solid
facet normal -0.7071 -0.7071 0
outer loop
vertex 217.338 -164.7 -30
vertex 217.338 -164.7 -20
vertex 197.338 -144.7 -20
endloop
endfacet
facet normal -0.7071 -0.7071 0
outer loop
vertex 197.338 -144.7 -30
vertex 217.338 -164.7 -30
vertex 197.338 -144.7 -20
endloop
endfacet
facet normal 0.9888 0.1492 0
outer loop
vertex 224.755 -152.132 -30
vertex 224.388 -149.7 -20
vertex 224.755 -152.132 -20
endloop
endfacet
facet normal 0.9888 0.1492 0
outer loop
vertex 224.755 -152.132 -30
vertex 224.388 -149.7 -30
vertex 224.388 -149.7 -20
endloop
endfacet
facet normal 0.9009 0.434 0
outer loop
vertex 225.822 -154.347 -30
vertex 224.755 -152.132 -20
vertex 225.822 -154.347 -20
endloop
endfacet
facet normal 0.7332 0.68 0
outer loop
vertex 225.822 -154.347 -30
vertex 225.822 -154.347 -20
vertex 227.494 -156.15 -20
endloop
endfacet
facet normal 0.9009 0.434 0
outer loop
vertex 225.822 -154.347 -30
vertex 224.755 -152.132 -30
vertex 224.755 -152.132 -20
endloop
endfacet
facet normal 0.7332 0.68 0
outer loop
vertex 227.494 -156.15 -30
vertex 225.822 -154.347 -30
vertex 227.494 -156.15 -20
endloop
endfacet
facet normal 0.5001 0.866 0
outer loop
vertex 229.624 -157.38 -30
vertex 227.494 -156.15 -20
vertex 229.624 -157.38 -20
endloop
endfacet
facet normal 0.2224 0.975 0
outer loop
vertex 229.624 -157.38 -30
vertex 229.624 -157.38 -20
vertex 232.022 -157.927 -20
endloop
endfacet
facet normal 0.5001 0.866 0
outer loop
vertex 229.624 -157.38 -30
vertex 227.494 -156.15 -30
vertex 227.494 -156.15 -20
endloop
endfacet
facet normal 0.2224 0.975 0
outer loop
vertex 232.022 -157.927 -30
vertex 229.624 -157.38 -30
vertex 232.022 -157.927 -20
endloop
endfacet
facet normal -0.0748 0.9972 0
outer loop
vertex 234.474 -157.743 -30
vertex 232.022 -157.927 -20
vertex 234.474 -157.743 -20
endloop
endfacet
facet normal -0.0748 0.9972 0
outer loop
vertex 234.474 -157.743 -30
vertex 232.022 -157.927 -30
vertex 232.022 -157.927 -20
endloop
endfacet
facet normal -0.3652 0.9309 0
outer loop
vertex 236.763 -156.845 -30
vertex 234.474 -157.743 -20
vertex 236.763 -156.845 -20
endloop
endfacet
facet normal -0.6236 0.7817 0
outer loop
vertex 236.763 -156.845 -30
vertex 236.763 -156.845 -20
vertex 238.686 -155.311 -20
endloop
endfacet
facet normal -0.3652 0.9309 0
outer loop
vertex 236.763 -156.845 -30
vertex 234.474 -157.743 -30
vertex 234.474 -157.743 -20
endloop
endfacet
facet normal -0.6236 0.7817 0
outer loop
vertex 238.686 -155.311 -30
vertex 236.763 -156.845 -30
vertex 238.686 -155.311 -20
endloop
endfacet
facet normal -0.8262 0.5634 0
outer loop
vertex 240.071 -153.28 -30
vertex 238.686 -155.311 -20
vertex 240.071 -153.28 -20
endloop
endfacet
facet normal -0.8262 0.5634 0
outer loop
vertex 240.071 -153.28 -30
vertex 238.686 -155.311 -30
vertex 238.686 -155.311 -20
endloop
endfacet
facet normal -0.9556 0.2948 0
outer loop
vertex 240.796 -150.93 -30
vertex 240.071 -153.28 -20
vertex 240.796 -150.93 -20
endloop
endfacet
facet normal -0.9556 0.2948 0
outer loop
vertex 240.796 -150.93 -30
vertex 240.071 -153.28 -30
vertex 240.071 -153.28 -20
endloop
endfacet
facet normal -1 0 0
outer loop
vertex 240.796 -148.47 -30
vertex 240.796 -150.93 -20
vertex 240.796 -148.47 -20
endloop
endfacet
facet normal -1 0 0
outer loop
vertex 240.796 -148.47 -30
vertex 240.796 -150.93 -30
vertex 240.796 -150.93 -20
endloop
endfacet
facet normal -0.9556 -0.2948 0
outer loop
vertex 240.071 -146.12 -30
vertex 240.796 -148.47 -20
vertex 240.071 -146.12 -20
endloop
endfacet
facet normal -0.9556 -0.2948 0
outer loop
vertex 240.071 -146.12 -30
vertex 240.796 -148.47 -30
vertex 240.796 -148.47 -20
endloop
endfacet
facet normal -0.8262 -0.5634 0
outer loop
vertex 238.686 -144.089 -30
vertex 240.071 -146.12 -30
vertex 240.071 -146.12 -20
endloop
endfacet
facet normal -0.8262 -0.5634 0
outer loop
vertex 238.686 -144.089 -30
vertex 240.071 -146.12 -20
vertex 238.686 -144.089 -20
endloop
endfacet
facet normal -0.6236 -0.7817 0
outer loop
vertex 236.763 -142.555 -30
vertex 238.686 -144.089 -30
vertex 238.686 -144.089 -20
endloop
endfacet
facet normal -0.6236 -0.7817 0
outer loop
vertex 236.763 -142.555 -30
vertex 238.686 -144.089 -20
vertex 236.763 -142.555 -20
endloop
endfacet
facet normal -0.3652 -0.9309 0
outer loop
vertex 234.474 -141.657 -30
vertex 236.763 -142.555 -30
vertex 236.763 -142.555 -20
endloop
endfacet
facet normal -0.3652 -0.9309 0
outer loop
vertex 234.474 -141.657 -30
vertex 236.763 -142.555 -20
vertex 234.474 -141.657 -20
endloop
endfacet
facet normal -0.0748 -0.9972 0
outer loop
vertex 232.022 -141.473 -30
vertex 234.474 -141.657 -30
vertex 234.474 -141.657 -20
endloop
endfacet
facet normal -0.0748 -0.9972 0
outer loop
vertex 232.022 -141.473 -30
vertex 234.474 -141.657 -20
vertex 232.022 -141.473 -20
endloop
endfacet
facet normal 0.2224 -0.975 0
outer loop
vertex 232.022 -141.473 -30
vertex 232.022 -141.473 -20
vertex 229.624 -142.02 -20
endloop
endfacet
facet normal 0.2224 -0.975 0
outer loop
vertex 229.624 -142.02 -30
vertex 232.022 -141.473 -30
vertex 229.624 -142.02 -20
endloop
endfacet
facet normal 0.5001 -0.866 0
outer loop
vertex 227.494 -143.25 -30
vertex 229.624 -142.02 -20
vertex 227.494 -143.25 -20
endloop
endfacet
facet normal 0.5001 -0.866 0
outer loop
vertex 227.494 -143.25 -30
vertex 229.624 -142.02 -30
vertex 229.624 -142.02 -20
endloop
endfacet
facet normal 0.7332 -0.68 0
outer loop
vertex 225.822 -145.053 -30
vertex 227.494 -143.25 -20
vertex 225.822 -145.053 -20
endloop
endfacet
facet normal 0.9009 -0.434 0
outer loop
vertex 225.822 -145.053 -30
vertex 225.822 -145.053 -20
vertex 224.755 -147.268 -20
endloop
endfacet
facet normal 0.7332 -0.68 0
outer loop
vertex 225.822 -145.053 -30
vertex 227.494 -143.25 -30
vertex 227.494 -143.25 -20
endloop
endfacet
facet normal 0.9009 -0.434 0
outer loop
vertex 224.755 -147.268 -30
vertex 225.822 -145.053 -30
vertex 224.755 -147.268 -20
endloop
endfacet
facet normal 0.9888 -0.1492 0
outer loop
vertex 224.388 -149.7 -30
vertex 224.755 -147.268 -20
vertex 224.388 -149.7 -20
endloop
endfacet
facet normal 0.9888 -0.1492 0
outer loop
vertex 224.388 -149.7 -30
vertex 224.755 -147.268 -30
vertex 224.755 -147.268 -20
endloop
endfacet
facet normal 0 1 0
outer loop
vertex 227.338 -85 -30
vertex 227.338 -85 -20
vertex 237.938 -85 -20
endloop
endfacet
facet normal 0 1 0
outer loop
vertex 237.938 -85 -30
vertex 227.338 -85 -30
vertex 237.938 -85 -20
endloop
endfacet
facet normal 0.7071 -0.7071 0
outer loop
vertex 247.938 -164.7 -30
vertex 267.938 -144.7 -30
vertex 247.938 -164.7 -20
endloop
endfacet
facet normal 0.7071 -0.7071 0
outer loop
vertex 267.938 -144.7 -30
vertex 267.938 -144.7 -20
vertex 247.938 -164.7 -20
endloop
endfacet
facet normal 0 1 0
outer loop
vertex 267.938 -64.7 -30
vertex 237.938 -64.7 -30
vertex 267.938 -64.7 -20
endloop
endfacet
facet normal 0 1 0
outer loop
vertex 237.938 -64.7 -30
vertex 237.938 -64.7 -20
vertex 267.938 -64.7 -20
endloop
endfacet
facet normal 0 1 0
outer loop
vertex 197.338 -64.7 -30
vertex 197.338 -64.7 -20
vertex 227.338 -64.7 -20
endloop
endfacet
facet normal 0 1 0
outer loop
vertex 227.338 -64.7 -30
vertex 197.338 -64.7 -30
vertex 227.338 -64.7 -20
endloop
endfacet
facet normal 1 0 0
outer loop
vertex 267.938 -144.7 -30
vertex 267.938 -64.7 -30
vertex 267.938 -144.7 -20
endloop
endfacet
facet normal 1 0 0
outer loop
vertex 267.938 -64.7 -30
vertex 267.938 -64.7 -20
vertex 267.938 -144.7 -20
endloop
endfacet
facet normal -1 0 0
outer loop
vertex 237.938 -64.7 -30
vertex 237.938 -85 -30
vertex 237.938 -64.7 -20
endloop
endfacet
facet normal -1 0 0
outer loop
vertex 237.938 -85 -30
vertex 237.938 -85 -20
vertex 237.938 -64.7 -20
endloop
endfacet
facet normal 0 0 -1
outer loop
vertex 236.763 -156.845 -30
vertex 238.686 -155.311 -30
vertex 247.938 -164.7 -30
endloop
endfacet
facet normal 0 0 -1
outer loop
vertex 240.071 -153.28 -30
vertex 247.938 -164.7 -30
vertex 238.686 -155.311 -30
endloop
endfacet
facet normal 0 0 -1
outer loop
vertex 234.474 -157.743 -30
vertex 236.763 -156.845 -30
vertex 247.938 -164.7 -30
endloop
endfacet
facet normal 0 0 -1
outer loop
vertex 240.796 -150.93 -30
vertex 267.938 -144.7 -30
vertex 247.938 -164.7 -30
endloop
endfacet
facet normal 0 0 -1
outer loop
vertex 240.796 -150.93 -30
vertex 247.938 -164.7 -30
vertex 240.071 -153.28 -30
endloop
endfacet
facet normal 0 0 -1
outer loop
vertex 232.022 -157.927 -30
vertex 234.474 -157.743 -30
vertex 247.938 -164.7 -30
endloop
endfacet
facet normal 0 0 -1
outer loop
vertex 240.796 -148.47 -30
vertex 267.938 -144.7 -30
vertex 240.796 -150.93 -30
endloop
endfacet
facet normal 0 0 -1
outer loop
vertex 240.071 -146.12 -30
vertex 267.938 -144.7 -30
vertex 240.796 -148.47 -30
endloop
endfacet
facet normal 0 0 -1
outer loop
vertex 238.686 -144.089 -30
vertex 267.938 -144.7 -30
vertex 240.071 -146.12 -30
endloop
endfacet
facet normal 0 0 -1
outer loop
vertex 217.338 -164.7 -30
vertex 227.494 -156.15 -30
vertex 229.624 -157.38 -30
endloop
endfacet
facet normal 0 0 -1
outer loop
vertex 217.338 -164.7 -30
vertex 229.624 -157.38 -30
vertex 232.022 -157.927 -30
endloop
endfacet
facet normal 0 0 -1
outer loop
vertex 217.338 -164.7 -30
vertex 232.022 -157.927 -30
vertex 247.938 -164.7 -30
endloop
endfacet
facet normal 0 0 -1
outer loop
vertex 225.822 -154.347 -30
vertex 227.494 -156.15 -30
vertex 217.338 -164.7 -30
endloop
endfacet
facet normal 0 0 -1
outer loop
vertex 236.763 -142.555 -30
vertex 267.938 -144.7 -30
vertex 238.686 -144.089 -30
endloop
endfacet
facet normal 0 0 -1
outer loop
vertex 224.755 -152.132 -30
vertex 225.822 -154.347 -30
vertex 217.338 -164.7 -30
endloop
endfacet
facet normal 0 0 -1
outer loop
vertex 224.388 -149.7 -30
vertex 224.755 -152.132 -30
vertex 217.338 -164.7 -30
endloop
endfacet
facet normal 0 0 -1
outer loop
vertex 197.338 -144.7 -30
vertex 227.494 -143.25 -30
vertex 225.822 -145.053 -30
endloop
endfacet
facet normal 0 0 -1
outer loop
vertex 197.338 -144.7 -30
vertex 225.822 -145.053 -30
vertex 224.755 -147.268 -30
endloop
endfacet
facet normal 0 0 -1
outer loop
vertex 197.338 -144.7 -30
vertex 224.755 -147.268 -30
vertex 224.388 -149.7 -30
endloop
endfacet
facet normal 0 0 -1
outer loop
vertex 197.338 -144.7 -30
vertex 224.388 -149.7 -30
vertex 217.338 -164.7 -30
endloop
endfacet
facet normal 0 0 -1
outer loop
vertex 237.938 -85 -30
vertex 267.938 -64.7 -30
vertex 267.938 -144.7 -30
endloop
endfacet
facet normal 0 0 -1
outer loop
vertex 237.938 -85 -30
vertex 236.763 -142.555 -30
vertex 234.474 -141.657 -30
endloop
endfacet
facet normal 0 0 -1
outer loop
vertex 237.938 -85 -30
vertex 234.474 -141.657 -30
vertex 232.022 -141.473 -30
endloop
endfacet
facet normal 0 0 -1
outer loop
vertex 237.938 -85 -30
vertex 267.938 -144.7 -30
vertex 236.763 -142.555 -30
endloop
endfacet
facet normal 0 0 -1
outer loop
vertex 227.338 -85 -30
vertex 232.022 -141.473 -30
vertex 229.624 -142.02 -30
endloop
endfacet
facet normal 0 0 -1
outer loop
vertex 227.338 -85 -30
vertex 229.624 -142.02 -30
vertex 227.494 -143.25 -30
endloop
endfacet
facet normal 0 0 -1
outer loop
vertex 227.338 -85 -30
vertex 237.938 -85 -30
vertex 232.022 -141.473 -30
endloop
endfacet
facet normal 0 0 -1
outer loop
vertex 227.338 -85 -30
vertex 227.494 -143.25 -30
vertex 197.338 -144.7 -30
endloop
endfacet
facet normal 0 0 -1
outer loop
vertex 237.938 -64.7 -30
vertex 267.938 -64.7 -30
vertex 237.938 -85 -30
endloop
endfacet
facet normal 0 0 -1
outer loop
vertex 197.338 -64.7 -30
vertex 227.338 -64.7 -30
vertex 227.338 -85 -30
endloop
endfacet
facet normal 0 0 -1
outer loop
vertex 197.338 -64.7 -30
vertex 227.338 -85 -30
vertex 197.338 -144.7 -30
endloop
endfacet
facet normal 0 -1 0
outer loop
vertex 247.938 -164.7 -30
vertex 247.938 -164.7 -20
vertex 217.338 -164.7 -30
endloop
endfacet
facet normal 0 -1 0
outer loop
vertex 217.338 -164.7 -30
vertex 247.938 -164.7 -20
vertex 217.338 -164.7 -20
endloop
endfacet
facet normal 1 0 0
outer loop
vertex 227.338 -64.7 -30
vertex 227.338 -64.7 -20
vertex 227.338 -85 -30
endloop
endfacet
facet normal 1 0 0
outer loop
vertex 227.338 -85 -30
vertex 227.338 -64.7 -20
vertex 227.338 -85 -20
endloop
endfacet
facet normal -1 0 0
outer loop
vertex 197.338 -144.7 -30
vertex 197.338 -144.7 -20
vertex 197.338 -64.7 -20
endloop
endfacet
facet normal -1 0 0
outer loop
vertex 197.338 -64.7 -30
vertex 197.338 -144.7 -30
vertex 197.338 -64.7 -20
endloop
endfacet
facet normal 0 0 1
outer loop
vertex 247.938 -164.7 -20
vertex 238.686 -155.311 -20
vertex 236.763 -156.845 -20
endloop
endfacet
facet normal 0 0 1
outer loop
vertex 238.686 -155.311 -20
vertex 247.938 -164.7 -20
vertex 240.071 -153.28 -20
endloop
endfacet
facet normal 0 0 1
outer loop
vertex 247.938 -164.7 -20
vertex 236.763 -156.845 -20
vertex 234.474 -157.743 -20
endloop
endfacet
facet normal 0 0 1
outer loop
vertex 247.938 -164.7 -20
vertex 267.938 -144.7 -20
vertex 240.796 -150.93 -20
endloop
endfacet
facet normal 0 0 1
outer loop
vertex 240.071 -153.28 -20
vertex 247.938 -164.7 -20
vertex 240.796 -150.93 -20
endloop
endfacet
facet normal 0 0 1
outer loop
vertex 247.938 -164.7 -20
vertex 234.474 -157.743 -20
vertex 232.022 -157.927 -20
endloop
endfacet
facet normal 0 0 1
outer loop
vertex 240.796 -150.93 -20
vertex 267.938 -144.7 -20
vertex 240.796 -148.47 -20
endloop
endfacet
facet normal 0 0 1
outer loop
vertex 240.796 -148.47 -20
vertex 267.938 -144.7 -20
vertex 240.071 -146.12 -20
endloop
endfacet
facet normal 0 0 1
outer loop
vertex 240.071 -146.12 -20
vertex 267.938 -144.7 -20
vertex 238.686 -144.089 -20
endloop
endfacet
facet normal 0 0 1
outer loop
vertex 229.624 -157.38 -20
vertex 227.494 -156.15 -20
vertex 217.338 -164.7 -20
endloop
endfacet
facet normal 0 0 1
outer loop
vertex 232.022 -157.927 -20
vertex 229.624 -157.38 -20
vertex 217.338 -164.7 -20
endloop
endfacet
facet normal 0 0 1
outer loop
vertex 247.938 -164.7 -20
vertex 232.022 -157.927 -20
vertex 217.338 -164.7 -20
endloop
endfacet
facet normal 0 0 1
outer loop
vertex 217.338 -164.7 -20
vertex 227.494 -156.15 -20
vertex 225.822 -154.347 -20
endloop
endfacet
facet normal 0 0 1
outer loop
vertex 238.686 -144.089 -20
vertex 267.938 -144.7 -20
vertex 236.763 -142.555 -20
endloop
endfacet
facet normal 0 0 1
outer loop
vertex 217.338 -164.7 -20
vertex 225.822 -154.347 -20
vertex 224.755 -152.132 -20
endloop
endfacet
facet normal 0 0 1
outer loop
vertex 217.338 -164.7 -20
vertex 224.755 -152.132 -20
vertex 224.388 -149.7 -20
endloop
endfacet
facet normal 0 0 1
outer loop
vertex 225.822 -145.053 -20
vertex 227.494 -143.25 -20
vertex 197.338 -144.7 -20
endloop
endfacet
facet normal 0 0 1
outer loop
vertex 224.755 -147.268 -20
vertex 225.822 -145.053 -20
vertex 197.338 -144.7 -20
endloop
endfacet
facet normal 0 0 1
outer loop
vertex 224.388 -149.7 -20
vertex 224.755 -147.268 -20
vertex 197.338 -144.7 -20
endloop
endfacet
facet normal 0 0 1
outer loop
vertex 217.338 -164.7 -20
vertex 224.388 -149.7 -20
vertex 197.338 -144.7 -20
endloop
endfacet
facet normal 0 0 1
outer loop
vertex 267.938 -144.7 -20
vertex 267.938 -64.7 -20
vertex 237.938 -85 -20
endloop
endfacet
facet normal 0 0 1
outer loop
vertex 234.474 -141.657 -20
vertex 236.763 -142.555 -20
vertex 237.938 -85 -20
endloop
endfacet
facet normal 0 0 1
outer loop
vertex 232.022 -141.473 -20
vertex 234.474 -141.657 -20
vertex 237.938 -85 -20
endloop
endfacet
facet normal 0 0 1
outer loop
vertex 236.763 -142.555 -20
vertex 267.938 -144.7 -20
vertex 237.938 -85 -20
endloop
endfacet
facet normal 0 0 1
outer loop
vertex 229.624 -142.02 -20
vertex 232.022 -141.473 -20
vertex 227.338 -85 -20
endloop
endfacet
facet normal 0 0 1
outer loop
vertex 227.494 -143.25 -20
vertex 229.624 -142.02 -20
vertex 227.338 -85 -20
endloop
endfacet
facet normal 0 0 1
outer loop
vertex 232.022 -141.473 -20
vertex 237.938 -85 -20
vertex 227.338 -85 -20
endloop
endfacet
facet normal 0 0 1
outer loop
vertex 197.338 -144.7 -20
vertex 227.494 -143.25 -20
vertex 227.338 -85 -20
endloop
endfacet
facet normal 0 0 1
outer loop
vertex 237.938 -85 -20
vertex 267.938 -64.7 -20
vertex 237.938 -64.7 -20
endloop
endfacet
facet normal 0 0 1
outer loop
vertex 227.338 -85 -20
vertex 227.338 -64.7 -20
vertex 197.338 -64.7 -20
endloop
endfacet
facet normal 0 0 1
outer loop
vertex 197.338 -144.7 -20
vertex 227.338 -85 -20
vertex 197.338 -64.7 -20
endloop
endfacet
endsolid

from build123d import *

# Parameters (mm, degrees)
SKETCH2_R           = 8.25
BOSS_EXTRUDE1_DEPTH = 5


with BuildPart() as part:
    # Sketch2 → Boss-Extrude1 (new, symmetric)
    with BuildSketch(Plane.XY.offset(-25)):
        Polygon((227.33813101, -85), (237.93813101, -85), (237.93813101, -64.7), (267.93813101, -64.7), (267.93813101, -144.7), (247.93813101, -164.7), (217.33813101, -164.7), (197.33813101, -144.7), (197.33813101, -64.7), (227.33813101, -64.7), align=None)
        with Locations(Location((232.63813101, -149.7, 0), (0, 0, 180))):
            Circle(SKETCH2_R, mode=Mode.SUBTRACT)
    extrude(amount=BOSS_EXTRUDE1_DEPTH, both=True)


solid = part.part
